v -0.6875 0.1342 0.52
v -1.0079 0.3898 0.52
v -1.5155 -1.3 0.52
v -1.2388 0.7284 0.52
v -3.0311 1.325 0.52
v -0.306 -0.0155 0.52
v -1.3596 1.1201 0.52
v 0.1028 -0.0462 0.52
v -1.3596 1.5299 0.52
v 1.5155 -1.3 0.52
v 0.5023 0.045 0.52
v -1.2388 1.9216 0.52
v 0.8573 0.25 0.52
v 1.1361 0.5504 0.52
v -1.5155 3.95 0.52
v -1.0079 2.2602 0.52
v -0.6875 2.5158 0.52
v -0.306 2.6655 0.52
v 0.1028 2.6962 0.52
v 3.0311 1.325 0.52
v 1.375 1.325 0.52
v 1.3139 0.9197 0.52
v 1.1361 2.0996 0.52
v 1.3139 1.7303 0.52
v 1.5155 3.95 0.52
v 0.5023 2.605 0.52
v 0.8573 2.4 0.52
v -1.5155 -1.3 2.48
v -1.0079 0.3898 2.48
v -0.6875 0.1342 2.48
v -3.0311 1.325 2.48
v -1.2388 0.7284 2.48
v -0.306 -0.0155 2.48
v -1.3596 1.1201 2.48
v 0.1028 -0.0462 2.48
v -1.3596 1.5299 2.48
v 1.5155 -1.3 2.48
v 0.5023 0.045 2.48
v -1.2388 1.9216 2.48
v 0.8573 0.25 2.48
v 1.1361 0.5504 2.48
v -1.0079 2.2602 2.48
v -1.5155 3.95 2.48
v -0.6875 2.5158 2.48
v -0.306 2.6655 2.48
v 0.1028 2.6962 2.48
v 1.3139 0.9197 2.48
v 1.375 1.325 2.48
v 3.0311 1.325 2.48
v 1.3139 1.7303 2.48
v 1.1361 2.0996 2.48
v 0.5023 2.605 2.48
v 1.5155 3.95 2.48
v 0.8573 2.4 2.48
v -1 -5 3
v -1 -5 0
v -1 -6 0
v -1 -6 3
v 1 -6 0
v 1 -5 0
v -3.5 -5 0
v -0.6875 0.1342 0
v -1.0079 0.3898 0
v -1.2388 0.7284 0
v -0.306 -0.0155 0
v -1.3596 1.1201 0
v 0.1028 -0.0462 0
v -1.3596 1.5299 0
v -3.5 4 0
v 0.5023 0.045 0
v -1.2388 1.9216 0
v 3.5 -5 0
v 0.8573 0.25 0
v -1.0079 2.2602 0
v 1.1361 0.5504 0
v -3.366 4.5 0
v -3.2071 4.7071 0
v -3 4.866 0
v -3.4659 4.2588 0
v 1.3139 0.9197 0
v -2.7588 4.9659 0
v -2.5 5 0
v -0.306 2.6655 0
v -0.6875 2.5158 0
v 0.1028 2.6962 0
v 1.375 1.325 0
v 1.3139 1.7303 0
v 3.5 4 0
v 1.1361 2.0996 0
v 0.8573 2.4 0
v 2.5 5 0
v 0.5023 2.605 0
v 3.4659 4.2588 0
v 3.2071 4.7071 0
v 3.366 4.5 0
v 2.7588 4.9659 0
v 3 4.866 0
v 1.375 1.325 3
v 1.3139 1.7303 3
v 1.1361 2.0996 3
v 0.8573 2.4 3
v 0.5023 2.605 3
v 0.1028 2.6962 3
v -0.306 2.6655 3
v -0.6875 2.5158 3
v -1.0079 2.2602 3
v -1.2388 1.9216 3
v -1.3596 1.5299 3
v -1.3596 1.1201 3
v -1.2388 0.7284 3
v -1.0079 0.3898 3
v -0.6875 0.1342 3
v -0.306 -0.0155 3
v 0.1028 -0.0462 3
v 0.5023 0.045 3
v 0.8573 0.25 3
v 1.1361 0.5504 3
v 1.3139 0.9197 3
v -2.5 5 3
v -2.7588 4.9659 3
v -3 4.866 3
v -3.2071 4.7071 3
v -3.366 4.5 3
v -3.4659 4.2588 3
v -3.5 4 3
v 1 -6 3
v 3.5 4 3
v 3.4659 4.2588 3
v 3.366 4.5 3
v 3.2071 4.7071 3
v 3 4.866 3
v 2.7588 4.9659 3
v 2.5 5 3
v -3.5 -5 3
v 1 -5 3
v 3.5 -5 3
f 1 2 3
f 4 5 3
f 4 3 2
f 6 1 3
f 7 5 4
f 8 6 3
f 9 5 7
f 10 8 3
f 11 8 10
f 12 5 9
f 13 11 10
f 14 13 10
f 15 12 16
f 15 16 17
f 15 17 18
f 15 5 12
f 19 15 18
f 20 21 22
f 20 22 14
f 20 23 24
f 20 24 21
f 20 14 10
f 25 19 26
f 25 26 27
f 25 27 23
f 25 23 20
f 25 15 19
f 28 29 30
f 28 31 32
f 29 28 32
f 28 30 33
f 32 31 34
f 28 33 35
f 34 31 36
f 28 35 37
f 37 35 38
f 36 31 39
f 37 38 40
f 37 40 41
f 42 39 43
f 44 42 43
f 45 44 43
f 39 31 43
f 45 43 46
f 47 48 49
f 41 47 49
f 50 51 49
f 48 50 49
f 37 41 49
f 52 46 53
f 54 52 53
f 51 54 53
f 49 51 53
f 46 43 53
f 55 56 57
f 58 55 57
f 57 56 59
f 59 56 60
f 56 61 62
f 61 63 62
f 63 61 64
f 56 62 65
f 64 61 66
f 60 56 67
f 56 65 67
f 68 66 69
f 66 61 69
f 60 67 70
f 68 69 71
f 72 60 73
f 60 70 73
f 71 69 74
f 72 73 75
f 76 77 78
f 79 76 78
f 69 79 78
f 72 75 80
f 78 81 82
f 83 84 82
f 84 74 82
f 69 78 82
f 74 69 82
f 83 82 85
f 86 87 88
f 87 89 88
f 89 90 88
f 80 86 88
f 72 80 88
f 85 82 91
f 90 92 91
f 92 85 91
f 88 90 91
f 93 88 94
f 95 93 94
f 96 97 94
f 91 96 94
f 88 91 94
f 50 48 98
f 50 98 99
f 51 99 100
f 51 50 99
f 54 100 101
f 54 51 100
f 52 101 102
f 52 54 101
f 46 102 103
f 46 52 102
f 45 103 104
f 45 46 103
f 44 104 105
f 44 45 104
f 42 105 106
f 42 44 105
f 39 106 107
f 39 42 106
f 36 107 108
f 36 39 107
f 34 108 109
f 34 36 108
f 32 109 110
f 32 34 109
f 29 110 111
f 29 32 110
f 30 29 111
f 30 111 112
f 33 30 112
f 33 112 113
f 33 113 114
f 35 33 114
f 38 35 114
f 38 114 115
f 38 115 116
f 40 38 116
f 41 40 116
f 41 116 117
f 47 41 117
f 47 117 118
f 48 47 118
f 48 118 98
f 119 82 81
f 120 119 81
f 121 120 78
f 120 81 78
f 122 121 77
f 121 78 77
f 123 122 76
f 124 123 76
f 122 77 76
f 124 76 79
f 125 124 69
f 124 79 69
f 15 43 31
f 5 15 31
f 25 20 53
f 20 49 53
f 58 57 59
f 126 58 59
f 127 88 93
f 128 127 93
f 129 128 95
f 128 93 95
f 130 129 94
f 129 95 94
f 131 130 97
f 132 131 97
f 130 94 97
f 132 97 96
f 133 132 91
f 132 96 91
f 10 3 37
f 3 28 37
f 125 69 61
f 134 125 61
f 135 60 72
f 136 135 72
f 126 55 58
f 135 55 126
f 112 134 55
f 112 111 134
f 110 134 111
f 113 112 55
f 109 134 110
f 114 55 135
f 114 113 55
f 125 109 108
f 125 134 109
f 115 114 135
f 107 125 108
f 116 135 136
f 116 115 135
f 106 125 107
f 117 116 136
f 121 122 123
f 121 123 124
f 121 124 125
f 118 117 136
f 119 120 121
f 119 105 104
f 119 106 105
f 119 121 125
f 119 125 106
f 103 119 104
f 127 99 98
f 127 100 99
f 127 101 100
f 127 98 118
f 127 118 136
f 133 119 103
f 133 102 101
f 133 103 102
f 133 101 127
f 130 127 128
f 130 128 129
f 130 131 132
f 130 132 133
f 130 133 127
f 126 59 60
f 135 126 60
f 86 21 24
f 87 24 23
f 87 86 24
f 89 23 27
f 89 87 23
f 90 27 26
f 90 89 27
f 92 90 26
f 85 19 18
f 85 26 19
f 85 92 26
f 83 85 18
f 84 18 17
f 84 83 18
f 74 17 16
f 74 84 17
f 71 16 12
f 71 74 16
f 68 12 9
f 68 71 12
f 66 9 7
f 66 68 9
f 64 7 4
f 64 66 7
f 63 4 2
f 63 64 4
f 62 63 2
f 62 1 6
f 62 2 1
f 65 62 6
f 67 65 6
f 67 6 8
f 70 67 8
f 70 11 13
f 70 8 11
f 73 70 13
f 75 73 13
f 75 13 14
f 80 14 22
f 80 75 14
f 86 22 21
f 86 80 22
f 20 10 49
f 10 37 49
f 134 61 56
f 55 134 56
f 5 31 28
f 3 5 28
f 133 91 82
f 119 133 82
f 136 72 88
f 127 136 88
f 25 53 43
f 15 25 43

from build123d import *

# Parameters (mm, degrees)
SKETCH1_R           = 1.375
BOSS_EXTRUDE1_DEPTH = 3
CUT_EXTRUDE1_DEPTH  = 0.98


with BuildPart() as part:
    # Sketch1 → Boss-Extrude1 (new body)
    with BuildSketch(Plane.XY):
        with BuildLine():
            Line((-1, -5), (-1, -6))
            Line((-1, -6), (1, -6))
            Line((1, -6), (1, -5))
            Line((1, -5), (3.5, -5))
            Line((3.5, -5), (3.5, 4))
            ThreePointArc((3.5, 4), (3.207106781, 4.707106781), (2.5, 5))
            Line((2.5, 5), (-2.5, 5))
            ThreePointArc((-2.5, 5), (-3.207106781, 4.707106781), (-3.5, 4))
            Line((-3.5, 4), (-3.5, -5))
            Line((-3.5, -5), (-1, -5))
        make_face()
        with Locations((0, 1.325)):
            Circle(SKETCH1_R, mode=Mode.SUBTRACT)
    extrude(amount=BOSS_EXTRUDE1_DEPTH)

    # Sketch2 → Cut-Extrude1 (cut, symmetric)
    with BuildSketch(Plane.XY.offset(1.5)):
        Polygon((3.031088913, 1.325), (1.515544457, 3.95), (-1.515544457, 3.95), (-3.031088913, 1.325), (-1.515544457, -1.3), (1.515544457, -1.3), align=None)
    extrude(amount=CUT_EXTRUDE1_DEPTH, both=True, mode=Mode.SUBTRACT)


solid = part.part
